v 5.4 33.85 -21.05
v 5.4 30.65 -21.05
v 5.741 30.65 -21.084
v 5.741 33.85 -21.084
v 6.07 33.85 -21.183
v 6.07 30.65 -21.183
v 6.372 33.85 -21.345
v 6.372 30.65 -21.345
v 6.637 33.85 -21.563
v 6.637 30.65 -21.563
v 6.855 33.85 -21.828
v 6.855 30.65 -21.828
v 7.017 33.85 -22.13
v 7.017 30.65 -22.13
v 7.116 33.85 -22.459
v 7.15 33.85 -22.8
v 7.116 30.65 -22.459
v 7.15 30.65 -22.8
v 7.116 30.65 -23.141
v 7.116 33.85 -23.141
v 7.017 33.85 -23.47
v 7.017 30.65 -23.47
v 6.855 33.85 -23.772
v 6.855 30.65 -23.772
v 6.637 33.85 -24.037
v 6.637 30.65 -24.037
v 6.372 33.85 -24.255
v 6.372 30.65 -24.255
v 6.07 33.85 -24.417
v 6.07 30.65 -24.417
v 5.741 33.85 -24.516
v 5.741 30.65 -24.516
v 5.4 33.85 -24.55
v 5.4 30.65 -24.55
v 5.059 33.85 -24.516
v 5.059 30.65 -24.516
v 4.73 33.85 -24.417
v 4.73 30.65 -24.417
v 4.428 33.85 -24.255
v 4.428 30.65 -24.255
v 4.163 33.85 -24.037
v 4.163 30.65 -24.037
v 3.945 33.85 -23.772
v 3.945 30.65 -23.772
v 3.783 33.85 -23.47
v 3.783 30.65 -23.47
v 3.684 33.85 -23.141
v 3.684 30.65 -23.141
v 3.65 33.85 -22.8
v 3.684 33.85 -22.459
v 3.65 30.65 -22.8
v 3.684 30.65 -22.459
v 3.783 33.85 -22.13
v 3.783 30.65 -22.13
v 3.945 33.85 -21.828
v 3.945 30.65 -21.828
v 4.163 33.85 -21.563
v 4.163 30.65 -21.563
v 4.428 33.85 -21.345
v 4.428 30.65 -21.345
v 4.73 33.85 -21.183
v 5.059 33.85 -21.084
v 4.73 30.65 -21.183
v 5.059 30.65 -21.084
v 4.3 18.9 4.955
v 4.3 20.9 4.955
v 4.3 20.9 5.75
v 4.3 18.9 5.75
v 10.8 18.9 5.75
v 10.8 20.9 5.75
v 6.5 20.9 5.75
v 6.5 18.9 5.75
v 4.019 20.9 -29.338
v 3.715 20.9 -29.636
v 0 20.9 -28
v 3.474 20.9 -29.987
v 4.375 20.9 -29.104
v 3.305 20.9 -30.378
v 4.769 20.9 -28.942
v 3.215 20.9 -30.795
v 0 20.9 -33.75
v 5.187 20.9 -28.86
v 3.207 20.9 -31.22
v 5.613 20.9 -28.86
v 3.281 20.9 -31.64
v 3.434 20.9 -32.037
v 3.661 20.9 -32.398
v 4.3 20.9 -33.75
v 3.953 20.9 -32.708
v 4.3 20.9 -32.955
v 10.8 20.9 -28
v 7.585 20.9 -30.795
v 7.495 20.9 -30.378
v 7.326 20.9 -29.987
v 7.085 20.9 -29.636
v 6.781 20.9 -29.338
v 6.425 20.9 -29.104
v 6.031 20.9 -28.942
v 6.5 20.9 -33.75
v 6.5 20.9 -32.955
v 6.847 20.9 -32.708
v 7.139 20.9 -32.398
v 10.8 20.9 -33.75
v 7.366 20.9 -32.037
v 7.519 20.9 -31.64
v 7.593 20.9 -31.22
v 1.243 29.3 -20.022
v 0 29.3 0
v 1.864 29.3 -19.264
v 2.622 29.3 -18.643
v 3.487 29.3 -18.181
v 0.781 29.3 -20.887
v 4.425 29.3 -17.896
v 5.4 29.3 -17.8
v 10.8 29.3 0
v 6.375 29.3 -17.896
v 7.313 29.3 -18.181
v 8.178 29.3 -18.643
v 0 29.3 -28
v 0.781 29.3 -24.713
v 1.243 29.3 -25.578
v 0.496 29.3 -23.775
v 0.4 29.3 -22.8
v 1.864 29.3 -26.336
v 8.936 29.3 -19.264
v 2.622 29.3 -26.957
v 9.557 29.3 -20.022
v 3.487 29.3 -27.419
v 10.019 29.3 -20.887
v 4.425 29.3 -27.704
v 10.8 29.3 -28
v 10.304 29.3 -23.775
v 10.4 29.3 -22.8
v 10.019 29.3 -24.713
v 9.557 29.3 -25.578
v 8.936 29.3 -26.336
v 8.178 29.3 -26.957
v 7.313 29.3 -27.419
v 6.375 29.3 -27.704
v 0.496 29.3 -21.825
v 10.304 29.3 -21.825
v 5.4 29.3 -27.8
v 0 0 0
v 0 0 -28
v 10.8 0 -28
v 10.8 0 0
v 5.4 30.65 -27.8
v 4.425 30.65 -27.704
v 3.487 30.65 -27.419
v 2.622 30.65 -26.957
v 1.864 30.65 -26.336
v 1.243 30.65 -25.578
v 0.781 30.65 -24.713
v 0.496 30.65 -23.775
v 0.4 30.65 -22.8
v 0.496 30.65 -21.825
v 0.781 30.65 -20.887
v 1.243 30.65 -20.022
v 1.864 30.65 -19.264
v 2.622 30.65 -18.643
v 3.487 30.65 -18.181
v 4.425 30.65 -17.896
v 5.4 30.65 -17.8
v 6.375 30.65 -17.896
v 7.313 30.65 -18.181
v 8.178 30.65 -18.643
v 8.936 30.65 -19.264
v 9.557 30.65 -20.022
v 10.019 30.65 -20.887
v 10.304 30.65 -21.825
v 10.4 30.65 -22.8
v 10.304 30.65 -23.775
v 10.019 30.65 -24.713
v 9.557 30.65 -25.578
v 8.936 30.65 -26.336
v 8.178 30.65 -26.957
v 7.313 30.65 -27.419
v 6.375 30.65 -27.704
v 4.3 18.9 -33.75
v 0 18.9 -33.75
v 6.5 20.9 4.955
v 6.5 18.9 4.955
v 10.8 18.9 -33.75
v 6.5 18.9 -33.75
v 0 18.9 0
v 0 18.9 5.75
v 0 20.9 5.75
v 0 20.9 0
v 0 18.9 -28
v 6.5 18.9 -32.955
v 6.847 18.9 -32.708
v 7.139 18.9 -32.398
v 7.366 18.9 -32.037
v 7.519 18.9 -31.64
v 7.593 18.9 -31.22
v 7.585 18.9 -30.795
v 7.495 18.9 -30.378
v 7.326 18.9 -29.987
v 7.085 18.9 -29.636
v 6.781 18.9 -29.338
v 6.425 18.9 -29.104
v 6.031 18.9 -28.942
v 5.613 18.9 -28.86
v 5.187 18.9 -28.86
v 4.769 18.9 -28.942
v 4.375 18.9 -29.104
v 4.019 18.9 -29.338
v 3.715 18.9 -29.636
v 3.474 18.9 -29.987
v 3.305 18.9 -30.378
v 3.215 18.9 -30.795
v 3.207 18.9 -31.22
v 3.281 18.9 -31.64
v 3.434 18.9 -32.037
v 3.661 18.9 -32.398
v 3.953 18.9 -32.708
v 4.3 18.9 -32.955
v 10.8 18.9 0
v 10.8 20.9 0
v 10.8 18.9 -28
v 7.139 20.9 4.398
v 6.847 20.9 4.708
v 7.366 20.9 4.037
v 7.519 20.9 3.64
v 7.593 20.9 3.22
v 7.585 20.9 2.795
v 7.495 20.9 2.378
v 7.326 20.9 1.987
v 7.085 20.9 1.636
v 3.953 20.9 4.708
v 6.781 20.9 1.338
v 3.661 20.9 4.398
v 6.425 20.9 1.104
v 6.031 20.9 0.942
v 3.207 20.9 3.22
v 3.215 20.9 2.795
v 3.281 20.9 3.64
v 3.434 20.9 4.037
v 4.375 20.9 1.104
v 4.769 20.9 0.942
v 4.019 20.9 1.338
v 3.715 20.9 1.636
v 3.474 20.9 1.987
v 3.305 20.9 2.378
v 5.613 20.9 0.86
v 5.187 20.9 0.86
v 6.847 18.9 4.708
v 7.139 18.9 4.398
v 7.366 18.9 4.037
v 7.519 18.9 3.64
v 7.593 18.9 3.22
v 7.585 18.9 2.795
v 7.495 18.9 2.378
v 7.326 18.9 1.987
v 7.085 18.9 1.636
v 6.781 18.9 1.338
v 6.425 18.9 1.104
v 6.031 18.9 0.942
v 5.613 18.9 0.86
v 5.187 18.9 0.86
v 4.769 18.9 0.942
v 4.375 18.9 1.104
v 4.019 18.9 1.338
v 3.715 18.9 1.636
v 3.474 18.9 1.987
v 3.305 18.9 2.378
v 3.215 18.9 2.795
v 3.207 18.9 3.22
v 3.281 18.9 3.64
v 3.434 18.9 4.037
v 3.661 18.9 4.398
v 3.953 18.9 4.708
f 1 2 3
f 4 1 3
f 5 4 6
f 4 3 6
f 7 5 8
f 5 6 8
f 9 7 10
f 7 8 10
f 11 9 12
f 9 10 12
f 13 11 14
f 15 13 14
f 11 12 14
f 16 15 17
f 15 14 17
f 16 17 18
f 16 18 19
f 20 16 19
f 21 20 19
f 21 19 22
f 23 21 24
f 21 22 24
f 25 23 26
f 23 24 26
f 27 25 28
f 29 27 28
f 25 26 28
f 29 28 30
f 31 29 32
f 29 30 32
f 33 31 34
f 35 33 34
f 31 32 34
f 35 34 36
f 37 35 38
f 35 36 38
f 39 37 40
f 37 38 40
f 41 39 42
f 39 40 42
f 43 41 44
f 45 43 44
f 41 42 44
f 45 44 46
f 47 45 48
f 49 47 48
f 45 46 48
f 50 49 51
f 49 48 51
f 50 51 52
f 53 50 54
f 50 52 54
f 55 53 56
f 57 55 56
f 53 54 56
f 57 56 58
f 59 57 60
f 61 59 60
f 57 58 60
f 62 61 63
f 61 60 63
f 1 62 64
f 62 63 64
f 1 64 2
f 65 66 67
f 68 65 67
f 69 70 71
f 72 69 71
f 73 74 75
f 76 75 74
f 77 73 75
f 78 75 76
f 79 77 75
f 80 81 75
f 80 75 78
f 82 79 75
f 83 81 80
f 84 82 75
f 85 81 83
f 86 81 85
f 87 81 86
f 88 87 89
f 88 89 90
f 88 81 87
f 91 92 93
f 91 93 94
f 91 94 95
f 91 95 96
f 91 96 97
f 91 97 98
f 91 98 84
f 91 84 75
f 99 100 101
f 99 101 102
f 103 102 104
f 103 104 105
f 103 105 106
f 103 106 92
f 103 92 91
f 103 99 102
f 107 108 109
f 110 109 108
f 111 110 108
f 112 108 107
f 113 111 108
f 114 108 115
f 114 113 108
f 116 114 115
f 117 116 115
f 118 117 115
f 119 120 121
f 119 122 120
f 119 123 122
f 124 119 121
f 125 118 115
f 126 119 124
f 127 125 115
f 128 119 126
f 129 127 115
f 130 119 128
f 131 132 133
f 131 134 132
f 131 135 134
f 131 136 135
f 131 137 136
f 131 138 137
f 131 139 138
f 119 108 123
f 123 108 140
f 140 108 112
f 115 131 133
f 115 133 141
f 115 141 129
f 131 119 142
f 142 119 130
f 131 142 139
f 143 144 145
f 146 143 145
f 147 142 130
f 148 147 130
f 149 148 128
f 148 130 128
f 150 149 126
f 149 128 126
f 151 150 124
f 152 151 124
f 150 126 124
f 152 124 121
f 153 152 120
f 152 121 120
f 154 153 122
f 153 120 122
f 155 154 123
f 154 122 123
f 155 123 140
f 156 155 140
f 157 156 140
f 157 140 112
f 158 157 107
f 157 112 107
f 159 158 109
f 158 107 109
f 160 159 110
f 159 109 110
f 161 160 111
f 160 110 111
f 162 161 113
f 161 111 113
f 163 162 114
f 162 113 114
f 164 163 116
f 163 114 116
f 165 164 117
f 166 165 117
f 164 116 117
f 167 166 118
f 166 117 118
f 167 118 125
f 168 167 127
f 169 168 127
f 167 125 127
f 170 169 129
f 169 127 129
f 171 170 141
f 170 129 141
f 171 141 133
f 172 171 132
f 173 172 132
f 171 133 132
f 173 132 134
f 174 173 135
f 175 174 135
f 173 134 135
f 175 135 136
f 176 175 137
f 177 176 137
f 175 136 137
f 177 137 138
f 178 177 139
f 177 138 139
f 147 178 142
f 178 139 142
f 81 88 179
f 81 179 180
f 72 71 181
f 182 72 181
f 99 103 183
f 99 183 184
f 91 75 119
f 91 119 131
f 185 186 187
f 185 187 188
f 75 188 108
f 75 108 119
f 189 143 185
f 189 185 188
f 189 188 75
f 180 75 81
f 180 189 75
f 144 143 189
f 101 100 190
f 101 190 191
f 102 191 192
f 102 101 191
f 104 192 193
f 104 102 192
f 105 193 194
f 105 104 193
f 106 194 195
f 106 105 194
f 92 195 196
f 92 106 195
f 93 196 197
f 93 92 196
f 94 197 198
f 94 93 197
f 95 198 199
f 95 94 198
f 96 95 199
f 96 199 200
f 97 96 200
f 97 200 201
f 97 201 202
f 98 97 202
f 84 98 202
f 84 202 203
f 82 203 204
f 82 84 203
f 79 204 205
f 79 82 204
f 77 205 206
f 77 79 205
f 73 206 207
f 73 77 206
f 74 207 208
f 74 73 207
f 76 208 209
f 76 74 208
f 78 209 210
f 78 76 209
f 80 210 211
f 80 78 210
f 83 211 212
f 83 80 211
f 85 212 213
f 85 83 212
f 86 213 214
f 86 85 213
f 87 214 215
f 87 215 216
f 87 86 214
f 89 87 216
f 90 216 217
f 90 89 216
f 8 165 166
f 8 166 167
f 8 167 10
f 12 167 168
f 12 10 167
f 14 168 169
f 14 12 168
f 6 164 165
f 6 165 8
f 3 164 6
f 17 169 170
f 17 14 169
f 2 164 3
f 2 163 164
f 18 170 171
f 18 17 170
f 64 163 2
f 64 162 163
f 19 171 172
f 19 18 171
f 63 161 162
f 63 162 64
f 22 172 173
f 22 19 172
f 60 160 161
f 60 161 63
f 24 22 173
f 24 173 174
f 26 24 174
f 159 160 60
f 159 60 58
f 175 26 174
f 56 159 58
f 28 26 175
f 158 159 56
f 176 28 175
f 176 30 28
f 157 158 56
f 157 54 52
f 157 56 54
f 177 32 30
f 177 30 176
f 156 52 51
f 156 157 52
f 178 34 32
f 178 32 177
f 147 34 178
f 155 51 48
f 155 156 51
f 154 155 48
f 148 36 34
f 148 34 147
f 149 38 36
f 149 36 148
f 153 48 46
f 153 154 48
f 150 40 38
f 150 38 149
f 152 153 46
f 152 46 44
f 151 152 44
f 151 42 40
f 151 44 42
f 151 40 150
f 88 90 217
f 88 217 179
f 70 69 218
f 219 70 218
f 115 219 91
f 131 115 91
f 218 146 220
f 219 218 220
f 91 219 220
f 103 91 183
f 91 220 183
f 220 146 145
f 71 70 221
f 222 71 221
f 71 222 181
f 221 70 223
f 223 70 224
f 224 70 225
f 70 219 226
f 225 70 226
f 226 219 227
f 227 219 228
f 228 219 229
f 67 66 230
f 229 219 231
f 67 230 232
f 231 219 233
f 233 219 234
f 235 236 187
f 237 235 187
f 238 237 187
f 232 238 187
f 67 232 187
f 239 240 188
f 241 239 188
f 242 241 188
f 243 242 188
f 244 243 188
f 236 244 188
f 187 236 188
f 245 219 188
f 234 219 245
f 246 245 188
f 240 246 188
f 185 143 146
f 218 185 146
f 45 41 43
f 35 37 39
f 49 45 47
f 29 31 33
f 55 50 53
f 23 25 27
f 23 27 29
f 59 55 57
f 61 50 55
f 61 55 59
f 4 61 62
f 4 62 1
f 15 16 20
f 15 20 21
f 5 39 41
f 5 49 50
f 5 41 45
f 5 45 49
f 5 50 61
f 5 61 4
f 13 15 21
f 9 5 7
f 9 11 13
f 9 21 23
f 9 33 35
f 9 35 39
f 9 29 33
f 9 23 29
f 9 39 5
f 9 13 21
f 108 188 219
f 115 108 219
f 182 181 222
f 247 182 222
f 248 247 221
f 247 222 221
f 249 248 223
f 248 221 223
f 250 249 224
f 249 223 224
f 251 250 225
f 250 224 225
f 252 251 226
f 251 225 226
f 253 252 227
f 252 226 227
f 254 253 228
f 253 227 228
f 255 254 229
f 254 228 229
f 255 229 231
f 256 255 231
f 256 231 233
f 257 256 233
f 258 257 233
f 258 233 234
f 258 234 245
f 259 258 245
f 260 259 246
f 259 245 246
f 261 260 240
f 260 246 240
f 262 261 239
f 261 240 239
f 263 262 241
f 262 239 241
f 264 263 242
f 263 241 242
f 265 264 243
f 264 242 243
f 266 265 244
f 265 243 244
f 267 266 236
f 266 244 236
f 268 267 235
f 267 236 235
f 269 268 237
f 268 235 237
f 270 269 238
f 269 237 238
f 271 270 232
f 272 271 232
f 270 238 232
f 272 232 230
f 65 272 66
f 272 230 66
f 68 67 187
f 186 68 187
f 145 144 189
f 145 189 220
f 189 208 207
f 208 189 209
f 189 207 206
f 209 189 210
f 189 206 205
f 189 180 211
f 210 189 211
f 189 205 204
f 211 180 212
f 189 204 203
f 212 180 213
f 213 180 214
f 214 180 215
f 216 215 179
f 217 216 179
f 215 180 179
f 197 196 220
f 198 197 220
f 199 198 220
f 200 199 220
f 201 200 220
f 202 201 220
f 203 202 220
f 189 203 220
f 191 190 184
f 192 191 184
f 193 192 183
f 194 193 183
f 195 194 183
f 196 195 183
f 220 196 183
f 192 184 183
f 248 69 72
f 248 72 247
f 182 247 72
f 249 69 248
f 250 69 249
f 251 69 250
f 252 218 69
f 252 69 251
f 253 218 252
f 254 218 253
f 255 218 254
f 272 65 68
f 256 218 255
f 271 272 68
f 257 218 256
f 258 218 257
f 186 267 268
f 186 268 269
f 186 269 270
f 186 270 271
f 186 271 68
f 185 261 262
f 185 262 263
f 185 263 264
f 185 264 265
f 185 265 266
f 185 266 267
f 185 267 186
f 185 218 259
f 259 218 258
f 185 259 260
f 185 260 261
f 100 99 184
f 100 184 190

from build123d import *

# Parameters (mm, degrees)
SKETCH1_W           = 10.8
SKETCH1_H           = 28
BOSS_EXTRUDE1_DEPTH = 29.3
BOSS_EXTRUDE2_DEPTH = 2
SKETCH3_R           = 5
BOSS_EXTRUDE3_DEPTH = 1.35
SKETCH4_R           = 1.75
BOSS_EXTRUDE4_DEPTH = 3.2


with BuildPart() as part:
    # Sketch1 → Boss-Extrude1 (new body)
    with BuildSketch(Plane(origin=(0, 0, 0), x_dir=(1, 0, 0), z_dir=(0, 1, 0))):
        with Locations((5.4, 14)):
            Rectangle(SKETCH1_W, SKETCH1_H)
    extrude(amount=BOSS_EXTRUDE1_DEPTH)

    # Sketch2 → Boss-Extrude2 (add)
    with BuildSketch(Plane(origin=(0, 20.9, 0), x_dir=(1, 0, 0), z_dir=(0, 1, 0))):
        with BuildLine():
            Line((0, 28), (10.8, 28))
            Line((10.8, 28), (10.8, 33.75))
            Line((10.8, 33.75), (6.5, 33.75))
            Line((6.5, 33.75), (6.5, 32.955255888))
            ThreePointArc((6.5, 32.955255888), (5.4, 28.85), (4.3, 32.955255888))
            Line((4.3, 32.955255888), (4.3, 33.75))
            Line((4.3, 33.75), (0, 33.75))
            Line((0, 33.75), (0, 28))
        make_face()
        with BuildLine():
            Line((10.8, 0), (10.8, -5.75))
            Line((10.8, -5.75), (6.5, -5.75))
            Line((6.5, -5.75), (6.5, -4.955255888))
            ThreePointArc((6.5, -4.955255888), (5.4, -0.85), (4.3, -4.955255888))
            Line((4.3, -4.955255888), (4.3, -5.75))
            Line((4.3, -5.75), (0, -5.75))
            Line((0, -5.75), (0, 0))
            Line((0, 0), (10.8, 0))
        make_face()
    extrude(amount=-BOSS_EXTRUDE2_DEPTH)

    # Sketch3 → Boss-Extrude3 (add)
    with BuildSketch(Plane(origin=(0, 29.3, 0), x_dir=(1, 0, 0), z_dir=(0, 1, 0))):
        with Locations(Location((5.4, 22.8, 0), (0, 0, 90))):
            Circle(SKETCH3_R)
    extrude(amount=BOSS_EXTRUDE3_DEPTH)

    # Sketch4 → Boss-Extrude4 (add)
    with BuildSketch(Plane(origin=(0, 30.65, 0), x_dir=(1, 0, 0), z_dir=(0, 1, 0))):
        with Locations(Location((5.4, 22.8, 0), (0, 0, 270))):
            Circle(SKETCH4_R)
    extrude(amount=BOSS_EXTRUDE4_DEPTH)


solid = part.part
